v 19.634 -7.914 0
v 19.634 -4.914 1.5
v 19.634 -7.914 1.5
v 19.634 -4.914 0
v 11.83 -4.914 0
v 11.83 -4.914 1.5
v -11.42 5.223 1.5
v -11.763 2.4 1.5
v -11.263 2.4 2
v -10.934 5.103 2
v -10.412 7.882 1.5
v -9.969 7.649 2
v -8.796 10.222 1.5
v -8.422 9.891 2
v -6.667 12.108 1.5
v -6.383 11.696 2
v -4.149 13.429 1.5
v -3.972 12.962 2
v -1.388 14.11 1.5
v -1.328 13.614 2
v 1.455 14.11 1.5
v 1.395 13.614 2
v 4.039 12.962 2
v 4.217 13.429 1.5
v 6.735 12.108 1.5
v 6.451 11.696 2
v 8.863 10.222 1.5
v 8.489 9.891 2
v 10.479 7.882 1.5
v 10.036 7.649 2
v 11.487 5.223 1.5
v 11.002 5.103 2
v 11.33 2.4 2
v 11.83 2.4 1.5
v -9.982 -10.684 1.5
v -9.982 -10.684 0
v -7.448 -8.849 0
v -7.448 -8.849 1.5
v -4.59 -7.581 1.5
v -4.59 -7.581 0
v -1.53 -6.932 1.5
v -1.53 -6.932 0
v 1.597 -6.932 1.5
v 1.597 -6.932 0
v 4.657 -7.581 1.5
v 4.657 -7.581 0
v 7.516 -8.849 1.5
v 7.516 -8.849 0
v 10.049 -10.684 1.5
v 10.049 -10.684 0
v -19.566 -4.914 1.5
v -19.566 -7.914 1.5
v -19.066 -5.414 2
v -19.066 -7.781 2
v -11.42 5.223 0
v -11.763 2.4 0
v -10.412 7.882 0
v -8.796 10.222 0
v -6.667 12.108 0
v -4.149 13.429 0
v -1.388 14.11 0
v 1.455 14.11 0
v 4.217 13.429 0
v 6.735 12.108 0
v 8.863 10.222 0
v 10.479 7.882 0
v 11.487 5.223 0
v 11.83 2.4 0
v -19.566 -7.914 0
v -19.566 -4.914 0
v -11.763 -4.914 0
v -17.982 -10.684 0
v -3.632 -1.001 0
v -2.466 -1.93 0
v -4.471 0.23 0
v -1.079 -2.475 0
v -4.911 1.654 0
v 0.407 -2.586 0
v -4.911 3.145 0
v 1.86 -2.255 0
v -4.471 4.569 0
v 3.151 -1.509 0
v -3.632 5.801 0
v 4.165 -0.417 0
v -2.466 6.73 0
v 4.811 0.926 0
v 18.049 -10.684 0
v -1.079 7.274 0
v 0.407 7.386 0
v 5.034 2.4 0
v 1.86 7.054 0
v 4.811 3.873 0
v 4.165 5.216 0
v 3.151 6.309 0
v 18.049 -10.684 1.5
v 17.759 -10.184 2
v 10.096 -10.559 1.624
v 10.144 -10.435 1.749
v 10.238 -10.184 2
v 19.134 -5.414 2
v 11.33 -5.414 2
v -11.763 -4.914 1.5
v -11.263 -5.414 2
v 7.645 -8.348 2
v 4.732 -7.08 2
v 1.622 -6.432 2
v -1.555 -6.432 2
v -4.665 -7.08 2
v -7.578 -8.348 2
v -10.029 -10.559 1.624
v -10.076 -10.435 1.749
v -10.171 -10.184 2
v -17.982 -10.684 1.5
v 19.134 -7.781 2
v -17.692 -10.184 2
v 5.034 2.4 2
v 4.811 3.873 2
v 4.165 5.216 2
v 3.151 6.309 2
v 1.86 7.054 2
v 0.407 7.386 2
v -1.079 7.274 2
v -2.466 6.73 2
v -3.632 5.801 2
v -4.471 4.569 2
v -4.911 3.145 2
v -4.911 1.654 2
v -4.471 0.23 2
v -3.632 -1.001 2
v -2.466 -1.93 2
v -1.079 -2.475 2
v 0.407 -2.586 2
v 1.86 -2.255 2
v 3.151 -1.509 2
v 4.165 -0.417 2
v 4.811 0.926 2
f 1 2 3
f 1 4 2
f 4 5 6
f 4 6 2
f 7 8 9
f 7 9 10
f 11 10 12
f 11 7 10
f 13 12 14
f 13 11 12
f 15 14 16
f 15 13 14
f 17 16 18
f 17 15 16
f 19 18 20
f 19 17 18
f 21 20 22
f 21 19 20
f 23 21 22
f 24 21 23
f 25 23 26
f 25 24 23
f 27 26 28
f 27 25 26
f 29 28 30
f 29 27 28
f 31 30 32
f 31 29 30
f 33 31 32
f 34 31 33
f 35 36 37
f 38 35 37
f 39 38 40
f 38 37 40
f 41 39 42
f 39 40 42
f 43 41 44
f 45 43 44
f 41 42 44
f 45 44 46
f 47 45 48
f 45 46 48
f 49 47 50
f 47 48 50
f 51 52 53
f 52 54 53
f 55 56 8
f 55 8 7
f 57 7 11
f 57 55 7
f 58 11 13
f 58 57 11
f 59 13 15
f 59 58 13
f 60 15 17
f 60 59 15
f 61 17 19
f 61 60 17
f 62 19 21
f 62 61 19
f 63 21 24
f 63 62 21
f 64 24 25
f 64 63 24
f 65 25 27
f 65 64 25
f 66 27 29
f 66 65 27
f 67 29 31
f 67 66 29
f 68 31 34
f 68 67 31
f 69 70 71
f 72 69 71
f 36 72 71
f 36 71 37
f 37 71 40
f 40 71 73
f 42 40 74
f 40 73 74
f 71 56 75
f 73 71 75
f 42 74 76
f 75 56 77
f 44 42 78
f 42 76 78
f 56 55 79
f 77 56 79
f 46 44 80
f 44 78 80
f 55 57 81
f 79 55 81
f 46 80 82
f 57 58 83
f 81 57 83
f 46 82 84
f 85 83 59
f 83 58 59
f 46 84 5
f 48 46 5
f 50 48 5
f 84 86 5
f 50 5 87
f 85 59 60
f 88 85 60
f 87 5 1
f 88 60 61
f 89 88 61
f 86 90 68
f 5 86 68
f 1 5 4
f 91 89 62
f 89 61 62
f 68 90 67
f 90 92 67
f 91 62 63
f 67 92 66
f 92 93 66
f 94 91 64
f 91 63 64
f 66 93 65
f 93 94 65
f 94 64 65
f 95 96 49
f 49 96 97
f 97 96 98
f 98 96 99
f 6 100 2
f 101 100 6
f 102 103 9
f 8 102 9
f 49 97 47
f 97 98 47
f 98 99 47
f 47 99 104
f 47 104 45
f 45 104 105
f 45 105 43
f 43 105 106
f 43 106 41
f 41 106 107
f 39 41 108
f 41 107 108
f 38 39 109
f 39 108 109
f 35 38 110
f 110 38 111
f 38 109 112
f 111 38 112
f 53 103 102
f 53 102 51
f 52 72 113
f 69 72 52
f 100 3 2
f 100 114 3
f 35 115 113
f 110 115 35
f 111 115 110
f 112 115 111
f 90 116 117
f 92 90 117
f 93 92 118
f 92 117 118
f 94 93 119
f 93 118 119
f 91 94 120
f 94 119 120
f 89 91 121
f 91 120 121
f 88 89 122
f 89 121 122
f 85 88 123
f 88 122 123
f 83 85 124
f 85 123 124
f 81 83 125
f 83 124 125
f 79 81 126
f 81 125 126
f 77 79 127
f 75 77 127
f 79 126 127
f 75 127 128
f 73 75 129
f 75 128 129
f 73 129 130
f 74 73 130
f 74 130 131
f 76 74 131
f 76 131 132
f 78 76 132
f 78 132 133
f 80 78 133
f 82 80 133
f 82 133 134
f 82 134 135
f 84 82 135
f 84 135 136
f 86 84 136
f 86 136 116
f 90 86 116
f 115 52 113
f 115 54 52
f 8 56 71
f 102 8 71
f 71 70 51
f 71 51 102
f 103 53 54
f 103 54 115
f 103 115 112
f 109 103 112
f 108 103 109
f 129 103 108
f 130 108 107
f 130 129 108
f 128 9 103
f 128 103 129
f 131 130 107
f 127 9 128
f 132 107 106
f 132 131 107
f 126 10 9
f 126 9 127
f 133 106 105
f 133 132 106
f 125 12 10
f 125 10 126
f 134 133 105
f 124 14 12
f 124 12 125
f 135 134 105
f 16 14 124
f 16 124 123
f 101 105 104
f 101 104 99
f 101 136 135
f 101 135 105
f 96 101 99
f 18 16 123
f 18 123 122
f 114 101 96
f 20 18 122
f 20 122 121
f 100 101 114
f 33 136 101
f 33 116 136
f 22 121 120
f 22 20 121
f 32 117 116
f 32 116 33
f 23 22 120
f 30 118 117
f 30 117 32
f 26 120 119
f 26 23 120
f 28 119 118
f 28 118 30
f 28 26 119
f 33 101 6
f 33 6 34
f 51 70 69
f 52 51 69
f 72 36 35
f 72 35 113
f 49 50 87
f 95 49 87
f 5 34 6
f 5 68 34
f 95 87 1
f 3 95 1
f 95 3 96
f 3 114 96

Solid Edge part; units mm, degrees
sketch "Sketch1" plane through (0, 0, 0) normal (0, 0, 1) x (1, 0, 0)
  arc A0 (-9.9816, -10.6836) -> (10.0488, -10.6836) centre (0.0336, -21.8503) cw
  line L0 (10.0488, -10.6836) -> (18.0488, -10.6836)
  line L1 (18.0488, -10.6836) -> (19.6336, -7.914)
  line L2 (19.6336, -4.914) -> (19.6336, -7.914)
  line L3 (11.8299, -4.914) -> (19.6336, -4.914)
  line L4 (11.8299, 2.3997) -> (11.8299, -4.914)
  arc A1 (-11.7627, 2.3997) -> (11.8299, 2.3997) centre (0.0336, 2.3997) cw
  line L5 (-11.7627, 2.3997) -> (-11.7627, -4.914)
  line L6 (-19.5664, -4.914) -> (-11.7627, -4.914)
  line L7 (-19.5664, -4.914) -> (-19.5664, -7.914)
  line L8 (-17.9816, -10.6836) -> (-19.5664, -7.914)
  line L9 (-9.9816, -10.6836) -> (-17.9816, -10.6836)
  dimension "D1" = 3
  dimension "D2" = 8
extrude "Protrusion1" add sketch "Sketch1" along normal blind 2
chamfer "Fase_1" distance 0.5 angle 45 12 edges at (14.0488, -10.6836, 2) (0.0336, -6.8503, 2) (-13.9816, -10.6836, 2) (-18.774, -9.2988, 2) (-19.5664, -6.414, 2) (-15.6646, -4.914, 2) (-11.7627, -1.2572, 2) (0.0336, 14.196, 2) (11.8299, -1.2572, 2) (15.7317, -4.914, 2) (19.6336, -6.414, 2) (18.8412, -9.2988, 2)
sketch "Sketch2" plane through (0.0336, 1.7562, 2) normal (0, 0, 1) x (1, 0, 0)
  circle A0 centre (0, 0.6435) radius 5
  dimension "D1" = 10
extrude "Cutout1" cut sketch "Sketch2" against normal through all
